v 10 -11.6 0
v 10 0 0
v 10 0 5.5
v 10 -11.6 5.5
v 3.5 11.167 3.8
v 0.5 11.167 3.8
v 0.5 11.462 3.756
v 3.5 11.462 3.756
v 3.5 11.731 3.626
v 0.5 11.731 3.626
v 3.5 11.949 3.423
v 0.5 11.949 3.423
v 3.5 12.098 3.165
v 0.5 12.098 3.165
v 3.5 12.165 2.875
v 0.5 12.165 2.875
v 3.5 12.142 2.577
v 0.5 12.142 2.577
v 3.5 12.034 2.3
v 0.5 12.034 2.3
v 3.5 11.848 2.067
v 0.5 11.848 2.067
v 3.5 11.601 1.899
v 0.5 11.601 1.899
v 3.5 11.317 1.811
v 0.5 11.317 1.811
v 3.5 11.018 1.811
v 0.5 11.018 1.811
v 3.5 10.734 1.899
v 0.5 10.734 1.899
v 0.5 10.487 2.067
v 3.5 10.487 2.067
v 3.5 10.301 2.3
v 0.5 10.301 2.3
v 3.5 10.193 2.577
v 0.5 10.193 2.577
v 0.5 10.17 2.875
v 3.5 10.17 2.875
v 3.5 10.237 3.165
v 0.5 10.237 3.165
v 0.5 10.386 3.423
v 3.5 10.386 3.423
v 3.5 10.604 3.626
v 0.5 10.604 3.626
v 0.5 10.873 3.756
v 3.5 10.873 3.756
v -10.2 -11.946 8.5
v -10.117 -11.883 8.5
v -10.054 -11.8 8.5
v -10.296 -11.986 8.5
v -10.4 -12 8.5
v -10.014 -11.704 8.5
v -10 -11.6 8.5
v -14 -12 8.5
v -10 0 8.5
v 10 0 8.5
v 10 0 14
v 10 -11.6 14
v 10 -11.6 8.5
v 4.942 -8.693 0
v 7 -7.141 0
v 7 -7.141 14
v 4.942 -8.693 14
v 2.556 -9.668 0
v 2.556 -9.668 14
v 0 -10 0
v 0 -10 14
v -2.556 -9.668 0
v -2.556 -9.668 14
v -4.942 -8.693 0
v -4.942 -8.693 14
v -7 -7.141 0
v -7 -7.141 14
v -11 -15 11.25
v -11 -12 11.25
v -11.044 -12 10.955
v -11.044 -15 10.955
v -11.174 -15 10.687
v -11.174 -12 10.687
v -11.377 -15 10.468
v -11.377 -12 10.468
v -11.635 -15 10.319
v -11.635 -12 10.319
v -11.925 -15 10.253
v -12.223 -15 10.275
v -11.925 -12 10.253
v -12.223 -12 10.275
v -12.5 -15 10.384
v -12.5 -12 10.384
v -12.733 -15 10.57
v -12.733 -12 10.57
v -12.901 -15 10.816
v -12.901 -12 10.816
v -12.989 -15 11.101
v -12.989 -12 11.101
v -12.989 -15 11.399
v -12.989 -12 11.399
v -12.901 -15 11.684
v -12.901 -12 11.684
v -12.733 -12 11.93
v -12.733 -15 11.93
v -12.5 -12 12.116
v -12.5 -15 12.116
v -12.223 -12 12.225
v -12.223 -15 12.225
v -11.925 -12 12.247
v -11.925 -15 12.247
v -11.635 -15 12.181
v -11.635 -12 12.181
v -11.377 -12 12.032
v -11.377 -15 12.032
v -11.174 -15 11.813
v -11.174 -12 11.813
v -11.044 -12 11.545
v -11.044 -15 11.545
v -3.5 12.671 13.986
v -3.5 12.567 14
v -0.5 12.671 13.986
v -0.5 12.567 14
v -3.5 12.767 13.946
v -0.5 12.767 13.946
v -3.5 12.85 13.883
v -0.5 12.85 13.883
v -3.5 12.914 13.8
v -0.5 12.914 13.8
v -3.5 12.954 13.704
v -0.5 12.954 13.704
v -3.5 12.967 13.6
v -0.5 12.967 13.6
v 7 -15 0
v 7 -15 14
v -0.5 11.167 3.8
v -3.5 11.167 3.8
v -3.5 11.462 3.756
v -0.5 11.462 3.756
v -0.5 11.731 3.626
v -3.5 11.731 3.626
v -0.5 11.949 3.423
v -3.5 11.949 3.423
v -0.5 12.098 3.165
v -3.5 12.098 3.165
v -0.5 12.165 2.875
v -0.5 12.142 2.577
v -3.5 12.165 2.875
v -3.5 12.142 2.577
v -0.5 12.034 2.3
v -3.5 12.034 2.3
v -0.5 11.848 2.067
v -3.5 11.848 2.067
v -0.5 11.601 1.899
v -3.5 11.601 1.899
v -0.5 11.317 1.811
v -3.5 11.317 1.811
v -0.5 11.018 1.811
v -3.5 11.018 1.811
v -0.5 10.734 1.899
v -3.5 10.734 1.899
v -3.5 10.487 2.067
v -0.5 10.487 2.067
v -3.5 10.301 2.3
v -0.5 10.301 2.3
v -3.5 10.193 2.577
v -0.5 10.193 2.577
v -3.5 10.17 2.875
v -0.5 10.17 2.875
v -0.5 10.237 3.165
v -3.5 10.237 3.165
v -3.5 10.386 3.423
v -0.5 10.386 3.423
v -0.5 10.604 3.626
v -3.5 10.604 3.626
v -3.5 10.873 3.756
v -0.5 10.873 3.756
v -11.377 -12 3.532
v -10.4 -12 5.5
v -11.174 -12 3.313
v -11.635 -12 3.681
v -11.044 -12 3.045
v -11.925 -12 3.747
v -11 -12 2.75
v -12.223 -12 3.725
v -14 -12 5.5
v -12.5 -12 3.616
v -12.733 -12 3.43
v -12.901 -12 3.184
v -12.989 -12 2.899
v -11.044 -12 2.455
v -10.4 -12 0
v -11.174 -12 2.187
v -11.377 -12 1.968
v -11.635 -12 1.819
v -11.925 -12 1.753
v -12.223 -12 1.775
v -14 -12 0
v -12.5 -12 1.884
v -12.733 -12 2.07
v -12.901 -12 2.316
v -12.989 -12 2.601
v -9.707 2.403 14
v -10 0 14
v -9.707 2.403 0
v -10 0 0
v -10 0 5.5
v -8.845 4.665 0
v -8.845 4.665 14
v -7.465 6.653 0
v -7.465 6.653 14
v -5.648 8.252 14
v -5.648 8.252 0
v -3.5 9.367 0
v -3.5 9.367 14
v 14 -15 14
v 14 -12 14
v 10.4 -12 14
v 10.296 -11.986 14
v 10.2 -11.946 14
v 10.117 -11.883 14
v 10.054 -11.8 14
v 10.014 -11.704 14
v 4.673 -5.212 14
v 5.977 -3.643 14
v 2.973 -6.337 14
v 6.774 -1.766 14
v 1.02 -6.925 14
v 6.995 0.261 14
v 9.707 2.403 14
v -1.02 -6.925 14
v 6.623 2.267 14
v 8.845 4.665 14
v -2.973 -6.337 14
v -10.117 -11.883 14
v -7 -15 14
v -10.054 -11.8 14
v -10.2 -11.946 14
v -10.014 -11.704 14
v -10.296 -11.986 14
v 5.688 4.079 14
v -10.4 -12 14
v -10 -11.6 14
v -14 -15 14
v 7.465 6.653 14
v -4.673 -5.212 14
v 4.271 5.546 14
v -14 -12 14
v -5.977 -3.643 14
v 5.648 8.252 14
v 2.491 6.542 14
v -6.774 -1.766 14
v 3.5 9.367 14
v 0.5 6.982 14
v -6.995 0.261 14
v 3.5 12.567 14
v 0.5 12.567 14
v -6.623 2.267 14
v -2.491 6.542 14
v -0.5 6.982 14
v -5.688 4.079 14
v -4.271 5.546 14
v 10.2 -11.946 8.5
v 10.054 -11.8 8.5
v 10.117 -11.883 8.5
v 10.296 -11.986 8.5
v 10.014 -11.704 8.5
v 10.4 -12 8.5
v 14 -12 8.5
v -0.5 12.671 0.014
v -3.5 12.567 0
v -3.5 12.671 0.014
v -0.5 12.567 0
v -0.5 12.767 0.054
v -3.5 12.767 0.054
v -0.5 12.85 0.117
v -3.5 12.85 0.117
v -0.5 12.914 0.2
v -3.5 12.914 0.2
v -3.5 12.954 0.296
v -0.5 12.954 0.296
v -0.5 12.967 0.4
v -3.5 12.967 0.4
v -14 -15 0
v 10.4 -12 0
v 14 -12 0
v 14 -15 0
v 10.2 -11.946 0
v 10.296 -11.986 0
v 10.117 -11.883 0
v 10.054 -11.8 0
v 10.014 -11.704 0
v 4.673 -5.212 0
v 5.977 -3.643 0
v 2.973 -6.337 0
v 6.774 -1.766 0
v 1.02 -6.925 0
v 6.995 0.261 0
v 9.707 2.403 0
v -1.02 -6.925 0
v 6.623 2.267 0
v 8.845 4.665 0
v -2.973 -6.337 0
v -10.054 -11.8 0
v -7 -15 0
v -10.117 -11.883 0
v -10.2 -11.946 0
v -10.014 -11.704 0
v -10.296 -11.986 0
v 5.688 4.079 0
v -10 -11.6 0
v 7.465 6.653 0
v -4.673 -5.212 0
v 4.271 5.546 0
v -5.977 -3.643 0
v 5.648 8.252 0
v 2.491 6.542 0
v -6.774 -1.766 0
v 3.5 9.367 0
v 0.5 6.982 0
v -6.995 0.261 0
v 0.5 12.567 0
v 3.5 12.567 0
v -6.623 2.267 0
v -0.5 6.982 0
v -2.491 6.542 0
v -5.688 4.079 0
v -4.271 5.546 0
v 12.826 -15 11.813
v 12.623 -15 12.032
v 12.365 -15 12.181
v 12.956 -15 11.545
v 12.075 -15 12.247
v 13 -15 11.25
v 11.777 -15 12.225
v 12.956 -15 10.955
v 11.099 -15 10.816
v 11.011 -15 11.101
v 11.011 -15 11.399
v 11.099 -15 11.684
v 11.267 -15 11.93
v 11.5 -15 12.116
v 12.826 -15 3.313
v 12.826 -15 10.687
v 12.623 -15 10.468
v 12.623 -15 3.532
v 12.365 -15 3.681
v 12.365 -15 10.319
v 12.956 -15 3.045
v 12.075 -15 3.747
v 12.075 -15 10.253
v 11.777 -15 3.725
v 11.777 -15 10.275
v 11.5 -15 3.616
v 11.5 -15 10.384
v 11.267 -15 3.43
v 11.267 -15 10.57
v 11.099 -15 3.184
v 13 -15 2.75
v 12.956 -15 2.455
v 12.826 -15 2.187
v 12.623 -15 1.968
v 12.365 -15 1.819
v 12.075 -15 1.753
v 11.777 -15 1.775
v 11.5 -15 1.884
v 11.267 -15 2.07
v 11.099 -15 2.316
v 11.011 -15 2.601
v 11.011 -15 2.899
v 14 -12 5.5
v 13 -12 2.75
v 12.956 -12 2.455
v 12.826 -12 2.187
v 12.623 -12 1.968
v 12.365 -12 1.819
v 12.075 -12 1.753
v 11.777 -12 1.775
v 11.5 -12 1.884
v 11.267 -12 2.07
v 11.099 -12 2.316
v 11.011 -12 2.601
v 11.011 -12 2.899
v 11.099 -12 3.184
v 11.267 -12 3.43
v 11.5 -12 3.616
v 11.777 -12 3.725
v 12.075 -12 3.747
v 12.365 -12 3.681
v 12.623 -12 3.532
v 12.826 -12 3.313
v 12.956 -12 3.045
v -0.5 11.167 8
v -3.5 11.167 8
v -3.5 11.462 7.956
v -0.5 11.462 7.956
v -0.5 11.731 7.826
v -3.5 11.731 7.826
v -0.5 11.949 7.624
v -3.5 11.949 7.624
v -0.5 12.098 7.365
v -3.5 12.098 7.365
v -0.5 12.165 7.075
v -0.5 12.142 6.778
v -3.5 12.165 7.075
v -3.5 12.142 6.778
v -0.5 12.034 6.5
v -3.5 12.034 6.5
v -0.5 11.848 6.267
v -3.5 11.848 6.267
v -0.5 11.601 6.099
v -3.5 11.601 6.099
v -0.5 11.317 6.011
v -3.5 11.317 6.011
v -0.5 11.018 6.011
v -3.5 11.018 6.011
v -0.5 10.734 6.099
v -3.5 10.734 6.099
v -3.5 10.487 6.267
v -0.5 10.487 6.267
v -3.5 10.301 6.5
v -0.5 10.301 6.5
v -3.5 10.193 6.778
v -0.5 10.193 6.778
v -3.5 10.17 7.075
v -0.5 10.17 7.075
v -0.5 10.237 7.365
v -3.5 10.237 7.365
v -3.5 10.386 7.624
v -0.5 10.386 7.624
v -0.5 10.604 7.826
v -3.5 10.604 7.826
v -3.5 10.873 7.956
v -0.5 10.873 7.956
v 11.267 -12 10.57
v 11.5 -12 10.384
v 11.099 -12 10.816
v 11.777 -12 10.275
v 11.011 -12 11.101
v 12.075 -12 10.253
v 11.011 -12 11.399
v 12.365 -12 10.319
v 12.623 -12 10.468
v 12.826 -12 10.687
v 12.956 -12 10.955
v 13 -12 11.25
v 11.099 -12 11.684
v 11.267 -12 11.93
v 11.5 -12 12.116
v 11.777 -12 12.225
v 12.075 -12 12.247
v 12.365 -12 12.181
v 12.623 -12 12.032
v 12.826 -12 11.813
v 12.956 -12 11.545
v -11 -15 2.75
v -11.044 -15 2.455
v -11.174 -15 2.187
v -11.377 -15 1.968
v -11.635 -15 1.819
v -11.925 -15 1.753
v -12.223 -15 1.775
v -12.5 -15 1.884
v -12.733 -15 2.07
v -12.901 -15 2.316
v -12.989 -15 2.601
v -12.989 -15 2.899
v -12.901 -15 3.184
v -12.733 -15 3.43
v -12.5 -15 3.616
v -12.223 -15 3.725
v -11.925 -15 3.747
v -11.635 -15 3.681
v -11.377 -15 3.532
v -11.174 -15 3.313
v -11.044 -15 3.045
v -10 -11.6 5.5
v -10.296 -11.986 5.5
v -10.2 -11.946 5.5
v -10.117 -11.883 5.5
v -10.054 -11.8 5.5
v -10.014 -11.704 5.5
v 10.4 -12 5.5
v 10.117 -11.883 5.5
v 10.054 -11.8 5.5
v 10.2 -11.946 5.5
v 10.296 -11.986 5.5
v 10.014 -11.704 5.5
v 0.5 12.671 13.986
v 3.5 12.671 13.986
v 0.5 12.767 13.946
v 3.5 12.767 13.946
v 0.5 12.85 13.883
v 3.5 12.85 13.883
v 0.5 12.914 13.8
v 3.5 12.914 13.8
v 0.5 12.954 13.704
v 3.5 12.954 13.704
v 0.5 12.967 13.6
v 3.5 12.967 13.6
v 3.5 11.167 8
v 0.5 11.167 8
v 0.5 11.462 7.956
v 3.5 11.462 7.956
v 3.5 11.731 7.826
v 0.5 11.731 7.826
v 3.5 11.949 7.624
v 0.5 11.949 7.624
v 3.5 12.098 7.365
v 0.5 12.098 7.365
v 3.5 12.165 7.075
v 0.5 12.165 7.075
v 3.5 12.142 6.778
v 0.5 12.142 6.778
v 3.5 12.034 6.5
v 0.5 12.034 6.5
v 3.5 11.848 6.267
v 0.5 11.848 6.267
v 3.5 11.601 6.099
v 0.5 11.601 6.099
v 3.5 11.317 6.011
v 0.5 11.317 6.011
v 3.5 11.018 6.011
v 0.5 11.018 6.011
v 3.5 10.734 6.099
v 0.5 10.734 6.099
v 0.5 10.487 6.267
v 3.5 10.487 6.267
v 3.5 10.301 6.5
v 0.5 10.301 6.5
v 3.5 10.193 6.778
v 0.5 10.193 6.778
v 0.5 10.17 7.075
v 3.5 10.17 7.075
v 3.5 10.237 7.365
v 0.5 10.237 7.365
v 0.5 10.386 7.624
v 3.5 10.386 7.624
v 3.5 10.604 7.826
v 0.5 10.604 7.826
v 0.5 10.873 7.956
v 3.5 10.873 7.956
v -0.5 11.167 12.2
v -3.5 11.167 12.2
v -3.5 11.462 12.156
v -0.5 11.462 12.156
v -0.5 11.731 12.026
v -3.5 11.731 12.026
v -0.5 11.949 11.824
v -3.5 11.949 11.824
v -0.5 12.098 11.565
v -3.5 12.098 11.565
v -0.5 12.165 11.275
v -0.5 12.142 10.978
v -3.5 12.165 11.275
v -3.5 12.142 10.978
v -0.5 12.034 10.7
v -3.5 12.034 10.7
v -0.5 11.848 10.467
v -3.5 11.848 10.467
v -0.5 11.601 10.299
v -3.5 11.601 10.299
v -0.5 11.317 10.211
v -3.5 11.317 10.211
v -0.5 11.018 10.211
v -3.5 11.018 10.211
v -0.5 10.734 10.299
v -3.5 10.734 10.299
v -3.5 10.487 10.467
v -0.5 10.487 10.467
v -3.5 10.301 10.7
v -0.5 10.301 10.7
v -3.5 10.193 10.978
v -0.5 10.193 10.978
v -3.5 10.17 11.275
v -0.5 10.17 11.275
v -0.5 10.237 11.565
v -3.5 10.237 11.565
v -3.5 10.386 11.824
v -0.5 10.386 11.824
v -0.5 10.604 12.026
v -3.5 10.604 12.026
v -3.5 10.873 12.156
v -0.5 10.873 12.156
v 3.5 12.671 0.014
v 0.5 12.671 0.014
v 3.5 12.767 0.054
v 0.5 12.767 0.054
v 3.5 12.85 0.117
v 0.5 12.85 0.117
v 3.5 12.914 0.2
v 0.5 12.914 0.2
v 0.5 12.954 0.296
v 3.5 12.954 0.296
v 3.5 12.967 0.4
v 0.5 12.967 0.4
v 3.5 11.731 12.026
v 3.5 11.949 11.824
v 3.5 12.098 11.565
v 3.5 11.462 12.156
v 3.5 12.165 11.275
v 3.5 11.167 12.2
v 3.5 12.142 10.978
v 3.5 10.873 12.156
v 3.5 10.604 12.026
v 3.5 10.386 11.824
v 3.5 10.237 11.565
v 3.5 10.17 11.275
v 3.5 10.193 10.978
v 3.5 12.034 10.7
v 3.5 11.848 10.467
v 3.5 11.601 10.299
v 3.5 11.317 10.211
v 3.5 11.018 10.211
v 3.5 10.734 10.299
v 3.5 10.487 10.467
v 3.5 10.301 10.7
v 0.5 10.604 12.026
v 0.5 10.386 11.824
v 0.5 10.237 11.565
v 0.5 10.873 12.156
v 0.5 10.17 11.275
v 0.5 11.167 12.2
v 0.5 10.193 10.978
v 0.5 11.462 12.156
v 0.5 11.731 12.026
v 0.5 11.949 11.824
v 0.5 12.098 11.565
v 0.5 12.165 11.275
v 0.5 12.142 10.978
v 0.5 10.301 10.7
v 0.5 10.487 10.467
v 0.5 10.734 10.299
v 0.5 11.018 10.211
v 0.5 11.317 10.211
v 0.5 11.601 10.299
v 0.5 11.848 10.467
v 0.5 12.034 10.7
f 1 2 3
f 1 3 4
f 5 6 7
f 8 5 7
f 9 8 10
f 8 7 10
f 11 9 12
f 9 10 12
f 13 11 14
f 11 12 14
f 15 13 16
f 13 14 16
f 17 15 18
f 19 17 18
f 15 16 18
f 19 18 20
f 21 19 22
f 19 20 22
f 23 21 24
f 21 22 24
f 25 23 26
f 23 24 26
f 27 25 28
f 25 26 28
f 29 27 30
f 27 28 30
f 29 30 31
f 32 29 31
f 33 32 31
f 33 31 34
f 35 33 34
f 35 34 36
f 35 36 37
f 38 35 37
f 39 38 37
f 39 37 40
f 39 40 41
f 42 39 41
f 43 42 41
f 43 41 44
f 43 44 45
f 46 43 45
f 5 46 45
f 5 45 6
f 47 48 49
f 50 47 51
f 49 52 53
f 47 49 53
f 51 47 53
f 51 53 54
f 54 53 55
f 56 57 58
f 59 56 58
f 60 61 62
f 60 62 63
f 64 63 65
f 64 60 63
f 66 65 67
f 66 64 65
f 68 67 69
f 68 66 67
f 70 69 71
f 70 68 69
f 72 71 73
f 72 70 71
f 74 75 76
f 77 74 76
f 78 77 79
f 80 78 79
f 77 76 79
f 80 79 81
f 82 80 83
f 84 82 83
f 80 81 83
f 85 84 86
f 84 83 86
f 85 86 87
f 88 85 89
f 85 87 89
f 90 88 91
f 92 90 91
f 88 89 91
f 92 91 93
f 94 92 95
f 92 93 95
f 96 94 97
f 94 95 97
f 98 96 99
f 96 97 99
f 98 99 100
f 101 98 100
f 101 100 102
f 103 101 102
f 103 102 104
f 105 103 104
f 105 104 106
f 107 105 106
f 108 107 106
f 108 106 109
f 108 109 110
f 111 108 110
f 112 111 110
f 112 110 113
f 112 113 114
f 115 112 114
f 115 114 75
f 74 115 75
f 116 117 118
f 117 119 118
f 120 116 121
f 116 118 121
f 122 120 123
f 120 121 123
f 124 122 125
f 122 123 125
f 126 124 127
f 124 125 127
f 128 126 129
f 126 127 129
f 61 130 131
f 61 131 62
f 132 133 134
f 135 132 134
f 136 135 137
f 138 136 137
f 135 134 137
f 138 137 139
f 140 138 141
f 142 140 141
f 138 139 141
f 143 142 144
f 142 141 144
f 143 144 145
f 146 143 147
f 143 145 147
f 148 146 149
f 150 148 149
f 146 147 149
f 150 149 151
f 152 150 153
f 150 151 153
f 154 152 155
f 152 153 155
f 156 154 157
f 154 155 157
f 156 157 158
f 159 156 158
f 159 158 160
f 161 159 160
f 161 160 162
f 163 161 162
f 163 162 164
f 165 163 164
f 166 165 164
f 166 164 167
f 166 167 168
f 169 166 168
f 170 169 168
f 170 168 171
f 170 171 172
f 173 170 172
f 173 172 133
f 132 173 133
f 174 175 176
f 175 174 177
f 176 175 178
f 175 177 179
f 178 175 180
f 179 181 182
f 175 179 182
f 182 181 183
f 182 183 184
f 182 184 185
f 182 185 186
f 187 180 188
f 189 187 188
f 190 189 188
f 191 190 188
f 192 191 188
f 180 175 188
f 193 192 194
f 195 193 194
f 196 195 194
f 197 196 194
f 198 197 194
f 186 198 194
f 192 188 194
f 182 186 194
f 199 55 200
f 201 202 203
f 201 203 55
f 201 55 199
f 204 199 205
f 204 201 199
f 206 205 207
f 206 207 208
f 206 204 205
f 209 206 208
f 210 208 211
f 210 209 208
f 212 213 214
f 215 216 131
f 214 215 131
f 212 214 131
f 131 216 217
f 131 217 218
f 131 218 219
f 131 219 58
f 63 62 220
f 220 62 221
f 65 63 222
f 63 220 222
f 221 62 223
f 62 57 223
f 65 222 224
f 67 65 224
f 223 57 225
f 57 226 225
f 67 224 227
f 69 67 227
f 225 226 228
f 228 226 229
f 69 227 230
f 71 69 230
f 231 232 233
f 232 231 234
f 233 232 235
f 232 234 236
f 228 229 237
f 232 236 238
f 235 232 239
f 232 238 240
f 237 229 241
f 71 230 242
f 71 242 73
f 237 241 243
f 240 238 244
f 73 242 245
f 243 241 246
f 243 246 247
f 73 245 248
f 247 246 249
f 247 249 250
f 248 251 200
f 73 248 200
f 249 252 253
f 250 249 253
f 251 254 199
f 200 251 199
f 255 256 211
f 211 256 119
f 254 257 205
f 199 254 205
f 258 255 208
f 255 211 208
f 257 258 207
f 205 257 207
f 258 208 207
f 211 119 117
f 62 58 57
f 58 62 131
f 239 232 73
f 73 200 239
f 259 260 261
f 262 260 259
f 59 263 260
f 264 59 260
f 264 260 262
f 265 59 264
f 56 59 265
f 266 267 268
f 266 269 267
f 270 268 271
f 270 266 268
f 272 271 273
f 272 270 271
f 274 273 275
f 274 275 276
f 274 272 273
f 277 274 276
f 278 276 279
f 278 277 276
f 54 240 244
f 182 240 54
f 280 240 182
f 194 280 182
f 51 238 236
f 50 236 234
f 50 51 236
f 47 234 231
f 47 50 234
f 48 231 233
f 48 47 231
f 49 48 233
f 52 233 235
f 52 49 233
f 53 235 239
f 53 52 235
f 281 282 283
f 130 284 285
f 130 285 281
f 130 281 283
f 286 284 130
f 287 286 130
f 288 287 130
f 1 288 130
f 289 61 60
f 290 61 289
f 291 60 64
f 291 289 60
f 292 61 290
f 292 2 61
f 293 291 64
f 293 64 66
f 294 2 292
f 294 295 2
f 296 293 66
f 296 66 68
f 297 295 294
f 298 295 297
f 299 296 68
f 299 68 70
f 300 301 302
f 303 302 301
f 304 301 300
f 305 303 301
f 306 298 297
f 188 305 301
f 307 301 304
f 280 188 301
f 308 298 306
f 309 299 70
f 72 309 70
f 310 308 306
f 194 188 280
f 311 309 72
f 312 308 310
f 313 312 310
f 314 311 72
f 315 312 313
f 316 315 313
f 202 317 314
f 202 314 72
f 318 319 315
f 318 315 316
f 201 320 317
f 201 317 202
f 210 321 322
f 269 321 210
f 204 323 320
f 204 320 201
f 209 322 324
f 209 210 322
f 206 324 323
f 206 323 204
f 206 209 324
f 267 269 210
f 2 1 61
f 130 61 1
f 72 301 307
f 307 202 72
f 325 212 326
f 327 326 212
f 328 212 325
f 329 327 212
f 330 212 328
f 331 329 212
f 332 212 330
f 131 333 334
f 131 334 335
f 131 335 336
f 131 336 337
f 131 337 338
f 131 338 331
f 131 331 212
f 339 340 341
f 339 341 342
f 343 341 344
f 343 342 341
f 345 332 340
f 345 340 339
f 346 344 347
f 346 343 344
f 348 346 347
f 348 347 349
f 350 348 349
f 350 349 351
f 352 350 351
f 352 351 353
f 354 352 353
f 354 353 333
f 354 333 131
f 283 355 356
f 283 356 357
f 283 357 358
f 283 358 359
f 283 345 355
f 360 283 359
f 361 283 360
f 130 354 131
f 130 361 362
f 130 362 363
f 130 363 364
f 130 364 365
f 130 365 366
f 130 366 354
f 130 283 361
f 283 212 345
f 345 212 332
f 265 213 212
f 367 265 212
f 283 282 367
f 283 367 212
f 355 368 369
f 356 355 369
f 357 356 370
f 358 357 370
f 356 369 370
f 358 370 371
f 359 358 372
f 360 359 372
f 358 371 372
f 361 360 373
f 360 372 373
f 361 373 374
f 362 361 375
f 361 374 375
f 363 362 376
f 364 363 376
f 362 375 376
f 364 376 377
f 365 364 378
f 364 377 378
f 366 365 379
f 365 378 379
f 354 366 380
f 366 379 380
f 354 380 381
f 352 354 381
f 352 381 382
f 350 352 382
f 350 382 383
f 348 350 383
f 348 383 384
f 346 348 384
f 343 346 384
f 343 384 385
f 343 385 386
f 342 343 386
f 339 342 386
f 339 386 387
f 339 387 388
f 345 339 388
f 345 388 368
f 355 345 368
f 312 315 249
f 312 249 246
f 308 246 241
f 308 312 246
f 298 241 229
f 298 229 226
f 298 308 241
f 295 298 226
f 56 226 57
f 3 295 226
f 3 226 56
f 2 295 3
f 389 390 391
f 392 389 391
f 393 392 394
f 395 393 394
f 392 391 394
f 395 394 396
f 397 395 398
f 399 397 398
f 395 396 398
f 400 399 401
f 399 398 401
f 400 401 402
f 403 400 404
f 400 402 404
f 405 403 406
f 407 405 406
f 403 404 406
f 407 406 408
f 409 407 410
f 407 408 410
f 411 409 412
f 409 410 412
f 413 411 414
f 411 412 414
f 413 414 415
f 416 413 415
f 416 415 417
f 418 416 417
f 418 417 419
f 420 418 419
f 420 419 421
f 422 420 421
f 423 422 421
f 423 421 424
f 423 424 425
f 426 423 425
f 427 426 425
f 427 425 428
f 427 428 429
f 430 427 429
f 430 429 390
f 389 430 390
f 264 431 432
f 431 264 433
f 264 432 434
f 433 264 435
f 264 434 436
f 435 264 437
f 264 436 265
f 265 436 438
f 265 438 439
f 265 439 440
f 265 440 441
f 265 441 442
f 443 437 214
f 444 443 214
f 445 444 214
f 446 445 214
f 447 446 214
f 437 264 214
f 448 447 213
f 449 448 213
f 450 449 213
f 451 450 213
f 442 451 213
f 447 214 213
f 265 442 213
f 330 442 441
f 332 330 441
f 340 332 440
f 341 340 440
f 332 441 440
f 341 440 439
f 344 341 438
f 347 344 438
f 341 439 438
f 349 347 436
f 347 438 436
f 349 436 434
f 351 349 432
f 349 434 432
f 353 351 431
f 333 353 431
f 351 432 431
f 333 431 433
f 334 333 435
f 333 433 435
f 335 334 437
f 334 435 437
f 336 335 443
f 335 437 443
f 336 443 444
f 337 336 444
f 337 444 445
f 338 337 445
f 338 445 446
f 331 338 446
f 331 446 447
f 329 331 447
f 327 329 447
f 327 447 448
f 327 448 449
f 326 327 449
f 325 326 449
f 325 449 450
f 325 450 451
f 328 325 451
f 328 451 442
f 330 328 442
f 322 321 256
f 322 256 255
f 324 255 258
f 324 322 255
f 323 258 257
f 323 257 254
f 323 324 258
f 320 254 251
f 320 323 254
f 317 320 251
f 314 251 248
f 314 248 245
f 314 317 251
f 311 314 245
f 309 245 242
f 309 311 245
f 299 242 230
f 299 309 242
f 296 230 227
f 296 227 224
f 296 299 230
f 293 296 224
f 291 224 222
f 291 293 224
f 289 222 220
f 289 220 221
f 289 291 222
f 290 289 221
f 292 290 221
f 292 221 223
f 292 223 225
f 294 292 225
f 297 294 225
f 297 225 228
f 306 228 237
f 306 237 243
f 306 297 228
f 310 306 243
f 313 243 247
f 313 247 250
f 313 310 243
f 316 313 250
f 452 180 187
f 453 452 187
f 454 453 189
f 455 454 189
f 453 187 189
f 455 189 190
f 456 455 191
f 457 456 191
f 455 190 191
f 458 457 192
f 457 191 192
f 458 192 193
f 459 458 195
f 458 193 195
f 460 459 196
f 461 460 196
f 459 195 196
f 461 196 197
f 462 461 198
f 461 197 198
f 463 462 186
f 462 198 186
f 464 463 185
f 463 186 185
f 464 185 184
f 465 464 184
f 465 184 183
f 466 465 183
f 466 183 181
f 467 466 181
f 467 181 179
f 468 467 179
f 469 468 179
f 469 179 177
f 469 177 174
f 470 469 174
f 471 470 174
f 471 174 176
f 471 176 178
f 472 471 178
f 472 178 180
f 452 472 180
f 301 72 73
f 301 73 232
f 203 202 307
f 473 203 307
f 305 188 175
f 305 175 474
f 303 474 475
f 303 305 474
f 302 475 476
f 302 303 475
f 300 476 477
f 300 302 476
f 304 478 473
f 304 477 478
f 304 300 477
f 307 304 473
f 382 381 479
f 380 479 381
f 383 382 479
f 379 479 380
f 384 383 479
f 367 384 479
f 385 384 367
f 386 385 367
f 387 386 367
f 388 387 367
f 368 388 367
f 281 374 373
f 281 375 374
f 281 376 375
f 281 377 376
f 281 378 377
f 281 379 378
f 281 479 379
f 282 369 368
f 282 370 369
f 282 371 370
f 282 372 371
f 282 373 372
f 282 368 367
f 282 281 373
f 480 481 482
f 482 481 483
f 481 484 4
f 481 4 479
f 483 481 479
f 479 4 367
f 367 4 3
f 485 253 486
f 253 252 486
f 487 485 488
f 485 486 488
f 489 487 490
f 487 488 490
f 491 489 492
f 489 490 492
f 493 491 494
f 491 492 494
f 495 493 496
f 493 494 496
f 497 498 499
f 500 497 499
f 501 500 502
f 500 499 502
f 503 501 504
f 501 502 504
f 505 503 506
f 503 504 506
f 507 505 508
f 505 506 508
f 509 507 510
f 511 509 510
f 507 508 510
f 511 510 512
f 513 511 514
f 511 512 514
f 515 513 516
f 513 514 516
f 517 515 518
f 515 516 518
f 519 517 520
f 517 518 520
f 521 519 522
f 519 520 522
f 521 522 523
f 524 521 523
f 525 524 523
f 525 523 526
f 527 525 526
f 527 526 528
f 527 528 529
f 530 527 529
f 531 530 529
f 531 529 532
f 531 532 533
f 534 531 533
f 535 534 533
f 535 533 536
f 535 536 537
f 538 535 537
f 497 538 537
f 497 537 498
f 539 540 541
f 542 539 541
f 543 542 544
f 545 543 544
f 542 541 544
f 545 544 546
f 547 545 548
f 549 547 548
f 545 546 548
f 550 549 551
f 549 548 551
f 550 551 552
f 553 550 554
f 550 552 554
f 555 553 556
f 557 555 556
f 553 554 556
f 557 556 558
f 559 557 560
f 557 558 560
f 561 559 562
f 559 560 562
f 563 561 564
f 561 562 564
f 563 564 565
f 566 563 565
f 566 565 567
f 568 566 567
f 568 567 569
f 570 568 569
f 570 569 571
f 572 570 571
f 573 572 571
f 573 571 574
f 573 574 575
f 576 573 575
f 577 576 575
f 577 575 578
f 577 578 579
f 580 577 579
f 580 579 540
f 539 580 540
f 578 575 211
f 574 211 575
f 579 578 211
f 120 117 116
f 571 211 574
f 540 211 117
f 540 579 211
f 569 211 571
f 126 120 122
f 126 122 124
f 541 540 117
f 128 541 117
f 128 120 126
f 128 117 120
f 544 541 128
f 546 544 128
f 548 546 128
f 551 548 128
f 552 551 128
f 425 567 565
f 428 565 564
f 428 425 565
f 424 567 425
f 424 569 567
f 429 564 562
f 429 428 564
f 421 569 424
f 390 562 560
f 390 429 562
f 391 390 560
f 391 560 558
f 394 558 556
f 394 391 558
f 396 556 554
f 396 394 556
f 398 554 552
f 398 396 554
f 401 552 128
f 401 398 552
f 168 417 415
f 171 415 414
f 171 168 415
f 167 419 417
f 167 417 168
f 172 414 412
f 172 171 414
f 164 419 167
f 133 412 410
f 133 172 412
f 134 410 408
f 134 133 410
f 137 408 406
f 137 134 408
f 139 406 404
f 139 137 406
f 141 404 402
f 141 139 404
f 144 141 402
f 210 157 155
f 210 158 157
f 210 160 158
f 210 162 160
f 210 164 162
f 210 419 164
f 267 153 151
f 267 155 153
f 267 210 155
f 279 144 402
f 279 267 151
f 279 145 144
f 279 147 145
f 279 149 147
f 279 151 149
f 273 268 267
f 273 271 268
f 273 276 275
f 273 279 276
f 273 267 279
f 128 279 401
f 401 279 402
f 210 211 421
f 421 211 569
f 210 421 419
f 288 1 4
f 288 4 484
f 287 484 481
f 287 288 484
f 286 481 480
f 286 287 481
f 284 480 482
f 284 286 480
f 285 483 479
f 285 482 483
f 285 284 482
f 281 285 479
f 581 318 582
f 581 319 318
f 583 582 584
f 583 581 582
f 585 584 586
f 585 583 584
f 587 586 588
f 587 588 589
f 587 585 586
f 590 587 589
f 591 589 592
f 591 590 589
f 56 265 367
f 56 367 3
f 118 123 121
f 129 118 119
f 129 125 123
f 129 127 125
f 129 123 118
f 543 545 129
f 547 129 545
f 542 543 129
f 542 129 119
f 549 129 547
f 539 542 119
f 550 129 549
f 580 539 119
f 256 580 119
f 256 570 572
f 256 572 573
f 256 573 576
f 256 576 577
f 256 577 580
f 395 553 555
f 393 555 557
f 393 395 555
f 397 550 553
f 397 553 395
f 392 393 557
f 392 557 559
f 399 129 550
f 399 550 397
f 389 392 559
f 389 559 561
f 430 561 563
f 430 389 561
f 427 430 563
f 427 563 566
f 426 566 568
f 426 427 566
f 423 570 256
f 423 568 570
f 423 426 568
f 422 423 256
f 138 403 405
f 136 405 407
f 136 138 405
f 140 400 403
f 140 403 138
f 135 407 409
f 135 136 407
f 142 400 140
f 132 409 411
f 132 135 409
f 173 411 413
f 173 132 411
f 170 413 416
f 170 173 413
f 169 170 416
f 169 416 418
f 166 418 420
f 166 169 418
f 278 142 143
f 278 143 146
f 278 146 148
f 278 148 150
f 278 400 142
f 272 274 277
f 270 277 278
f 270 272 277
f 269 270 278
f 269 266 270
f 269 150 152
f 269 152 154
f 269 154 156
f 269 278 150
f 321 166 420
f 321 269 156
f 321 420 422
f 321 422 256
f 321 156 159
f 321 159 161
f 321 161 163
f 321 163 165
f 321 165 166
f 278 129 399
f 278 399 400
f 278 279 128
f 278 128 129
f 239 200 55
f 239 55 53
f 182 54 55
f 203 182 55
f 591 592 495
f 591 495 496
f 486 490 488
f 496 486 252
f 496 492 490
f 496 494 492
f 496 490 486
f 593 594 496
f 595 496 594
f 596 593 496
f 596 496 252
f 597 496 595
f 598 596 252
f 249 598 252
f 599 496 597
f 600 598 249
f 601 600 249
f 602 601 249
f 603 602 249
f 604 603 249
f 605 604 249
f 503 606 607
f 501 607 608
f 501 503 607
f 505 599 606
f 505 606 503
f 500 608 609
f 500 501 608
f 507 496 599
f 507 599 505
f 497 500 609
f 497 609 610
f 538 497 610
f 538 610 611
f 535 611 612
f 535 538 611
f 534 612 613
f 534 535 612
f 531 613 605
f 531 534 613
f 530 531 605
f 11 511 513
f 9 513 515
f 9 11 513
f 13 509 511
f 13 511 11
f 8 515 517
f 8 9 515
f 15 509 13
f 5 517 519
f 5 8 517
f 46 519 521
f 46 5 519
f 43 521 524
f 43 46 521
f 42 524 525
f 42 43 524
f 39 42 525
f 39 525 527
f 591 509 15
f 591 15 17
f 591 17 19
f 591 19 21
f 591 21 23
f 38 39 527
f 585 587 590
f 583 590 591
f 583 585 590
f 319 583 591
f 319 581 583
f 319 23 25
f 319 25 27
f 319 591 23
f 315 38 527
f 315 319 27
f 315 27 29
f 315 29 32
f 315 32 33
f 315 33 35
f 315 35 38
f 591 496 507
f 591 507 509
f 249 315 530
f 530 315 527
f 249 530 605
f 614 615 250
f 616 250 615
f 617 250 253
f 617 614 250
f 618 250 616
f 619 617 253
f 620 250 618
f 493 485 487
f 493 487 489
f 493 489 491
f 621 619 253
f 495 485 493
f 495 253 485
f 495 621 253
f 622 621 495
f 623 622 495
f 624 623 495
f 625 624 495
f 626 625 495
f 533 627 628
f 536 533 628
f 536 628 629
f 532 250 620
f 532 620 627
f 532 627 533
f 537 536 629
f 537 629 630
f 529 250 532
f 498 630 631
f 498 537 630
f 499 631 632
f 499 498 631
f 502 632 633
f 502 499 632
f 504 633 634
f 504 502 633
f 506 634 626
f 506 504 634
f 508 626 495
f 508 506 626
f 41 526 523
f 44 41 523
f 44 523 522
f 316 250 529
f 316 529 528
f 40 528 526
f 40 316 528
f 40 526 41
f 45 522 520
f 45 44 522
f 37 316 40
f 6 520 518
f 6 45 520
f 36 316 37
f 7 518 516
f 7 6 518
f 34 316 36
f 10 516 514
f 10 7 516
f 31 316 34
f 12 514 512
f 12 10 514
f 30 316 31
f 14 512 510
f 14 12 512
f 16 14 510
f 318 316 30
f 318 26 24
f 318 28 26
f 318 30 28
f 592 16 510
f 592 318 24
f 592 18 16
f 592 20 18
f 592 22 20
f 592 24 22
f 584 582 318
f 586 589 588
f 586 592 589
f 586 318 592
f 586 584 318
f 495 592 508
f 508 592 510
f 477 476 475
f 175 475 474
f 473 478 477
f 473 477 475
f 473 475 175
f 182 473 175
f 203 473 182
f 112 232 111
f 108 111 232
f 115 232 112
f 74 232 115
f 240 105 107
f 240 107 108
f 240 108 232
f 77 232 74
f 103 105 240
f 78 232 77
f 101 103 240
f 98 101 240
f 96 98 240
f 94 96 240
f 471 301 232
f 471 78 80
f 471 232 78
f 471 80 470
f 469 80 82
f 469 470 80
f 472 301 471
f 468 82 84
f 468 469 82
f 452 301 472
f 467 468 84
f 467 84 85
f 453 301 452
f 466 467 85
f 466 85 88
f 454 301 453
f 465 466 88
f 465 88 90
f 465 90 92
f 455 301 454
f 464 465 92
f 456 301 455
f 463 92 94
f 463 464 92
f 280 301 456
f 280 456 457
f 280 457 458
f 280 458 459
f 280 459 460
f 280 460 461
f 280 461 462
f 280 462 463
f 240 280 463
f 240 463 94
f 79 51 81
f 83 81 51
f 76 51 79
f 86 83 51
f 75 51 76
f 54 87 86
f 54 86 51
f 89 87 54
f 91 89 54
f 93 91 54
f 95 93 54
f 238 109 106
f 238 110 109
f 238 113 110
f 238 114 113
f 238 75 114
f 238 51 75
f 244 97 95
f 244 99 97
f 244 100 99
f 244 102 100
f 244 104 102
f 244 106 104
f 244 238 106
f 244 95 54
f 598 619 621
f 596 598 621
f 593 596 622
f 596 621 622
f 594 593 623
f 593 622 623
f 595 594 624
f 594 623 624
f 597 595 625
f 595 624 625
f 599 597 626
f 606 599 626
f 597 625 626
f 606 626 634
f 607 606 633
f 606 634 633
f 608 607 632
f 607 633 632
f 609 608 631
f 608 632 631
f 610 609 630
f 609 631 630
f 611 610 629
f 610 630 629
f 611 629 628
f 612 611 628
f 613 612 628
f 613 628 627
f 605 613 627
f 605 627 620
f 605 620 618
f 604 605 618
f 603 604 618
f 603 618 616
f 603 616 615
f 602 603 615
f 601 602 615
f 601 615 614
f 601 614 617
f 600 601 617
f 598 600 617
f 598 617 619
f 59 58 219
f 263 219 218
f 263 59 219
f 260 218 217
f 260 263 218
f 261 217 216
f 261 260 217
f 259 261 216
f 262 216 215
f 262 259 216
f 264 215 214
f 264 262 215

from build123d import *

# Parameters (mm, degrees)
SALIENTE_EXTRUIR1_DEPTH    = 14
CROQUIS2_W                 = 0.4
CROQUIS2_H                 = 0.4
CORTAR_EXTRUIR1_DEPTH      = 1
CORTAR_EXTRUIR1_DEPTH_BACK = 15
SALIENTE_EXTRUIR2_DEPTH    = 14
CORTAR_EXTRUIR2_DEPTH      = 1
CORTAR_EXTRUIR2_DEPTH_BACK = 5.5
CORTAR_EXTRUIR3_DEPTH      = 5.5
SALIENTE_EXTRUIR3_DEPTH    = 14
CROQUIS7_R                 = 1
CORTAR_EXTRUIR4_DEPTH      = 4
REDONDEO3_R                = 0.4
CROQUIS9_R                 = 1
CORTAR_EXTRUIR5_DEPTH      = 18.5


with BuildPart() as part:
    # Croquis1 → Saliente-Extruir1 (new body)
    with BuildSketch(Plane.XY):
        with BuildLine():
            Line((0.5, 6.982120022), (0.5, 12.967496998))
            Line((0.5, 12.967496998), (3.5, 12.967496998))
            Line((3.5, 12.967496998), (3.5, 9.367496998))
            ThreePointArc((3.5, 9.367496998), (8.215838363, 5.700877125), (10, 0))
            Line((10, 0), (10, -11.6))
            ThreePointArc((10, -11.6), (10.117157288, -11.882842712), (10.4, -12))
            Line((10.4, -12), (14, -12))
            Line((14, -12), (14, -15))
            Line((14, -15), (7, -15))
            Line((7, -15), (7, -7.141428429))
            ThreePointArc((7, -7.141428429), (0, -10), (-7, -7.141428429))
            Line((-7, -7.141428429), (-7, -15))
            Line((-7, -15), (-14, -15))
            Line((-14, -15), (-14, -12))
            Line((-14, -12), (-10.4, -12))
            ThreePointArc((-10.4, -12), (-10.117157288, -11.882842712), (-10, -11.6))
            Line((-10, -11.6), (-10, 0))
            ThreePointArc((-10, 0), (-8.215838363, 5.700877125), (-3.5, 9.367496998))
            Line((-3.5, 9.367496998), (-3.5, 12.967496998))
            Line((-3.5, 12.967496998), (-0.5, 12.967496998))
            Line((-0.5, 12.967496998), (-0.5, 6.982120022))
            ThreePointArc((-0.5, 6.982120022), (0, -7), (0.5, 6.982120022))
        make_face()
    extrude(amount=SALIENTE_EXTRUIR1_DEPTH)

    # Croquis2 → Cortar-Extruir1 (cut, two sides)
    with BuildSketch(Plane.XY.offset(14)) as cortar_extruir1_sk:
        with Locations((-7.2, -14.8)):
            Rectangle(CROQUIS2_W, CROQUIS2_H)
        with Locations((7.2, -14.8)):
            Rectangle(CROQUIS2_W, CROQUIS2_H)
    extrude(amount=CORTAR_EXTRUIR1_DEPTH, mode=Mode.SUBTRACT)
    extrude(cortar_extruir1_sk.sketch, amount=-CORTAR_EXTRUIR1_DEPTH_BACK, mode=Mode.SUBTRACT)

    # Croquis4 → Saliente-Extruir2 (add, through all)
    with BuildSketch(Plane.XY.offset(14)):
        Polygon((-14, -12), (-10, 0), (-10, -12), align=None)
        Polygon((14, -12), (10, 0), (10, -12), align=None)
    extrude(amount=-SALIENTE_EXTRUIR2_DEPTH)

    # Croquis5 → Cortar-Extruir2 (cut, two sides)
    with BuildSketch(Plane.XY.offset(14)) as cortar_extruir2_sk:
        Polygon((-14, -12), (-10, 0), (-10, -12), align=None)
        Polygon((14, -12), (10, 0), (10, -12), align=None)
    extrude(amount=CORTAR_EXTRUIR2_DEPTH, mode=Mode.SUBTRACT)
    extrude(cortar_extruir2_sk.sketch, amount=-CORTAR_EXTRUIR2_DEPTH_BACK, mode=Mode.SUBTRACT)

    # Croquis6 → Cortar-Extruir3 (cut)
    with BuildSketch(Plane(origin=(0, 0, 0), x_dir=(-1, 0, 0), z_dir=(0, 0, -1))):
        Polygon((-14, -12), (-10, 0), (-10, -12), align=None)
        Polygon((14, -12), (10, 0), (10, -12), align=None)
    extrude(amount=-CORTAR_EXTRUIR3_DEPTH, mode=Mode.SUBTRACT)

    # Croquis1<2> → Saliente-Extruir3 (add, through all)
    with BuildSketch(Plane.XY):
        with BuildLine():
            Line((0.5, 6.982120022), (0.5, 12.967496998))
            Line((0.5, 12.967496998), (3.5, 12.967496998))
            Line((3.5, 12.967496998), (3.5, 9.367496998))
            ThreePointArc((3.5, 9.367496998), (8.215838363, 5.700877125), (10, 0))
            Line((10, 0), (10, -11.6))
            ThreePointArc((10, -11.6), (10.117157288, -11.882842712), (10.4, -12))
            Line((10.4, -12), (14, -12))
            Line((14, -12), (14, -15))
            Line((14, -15), (7, -15))
            Line((7, -15), (7, -7.141428429))
            ThreePointArc((7, -7.141428429), (0, -10), (-7, -7.141428429))
            Line((-7, -7.141428429), (-7, -15))
            Line((-7, -15), (-14, -15))
            Line((-14, -15), (-14, -12))
            Line((-14, -12), (-10.4, -12))
            ThreePointArc((-10.4, -12), (-10.117157288, -11.882842712), (-10, -11.6))
            Line((-10, -11.6), (-10, 0))
            ThreePointArc((-10, 0), (-8.215838363, 5.700877125), (-3.5, 9.367496998))
            Line((-3.5, 9.367496998), (-3.5, 12.967496998))
            Line((-3.5, 12.967496998), (-0.5, 12.967496998))
            Line((-0.5, 12.967496998), (-0.5, 6.982120022))
            ThreePointArc((-0.5, 6.982120022), (0, -7), (0.5, 6.982120022))
        make_face()
    extrude(amount=SALIENTE_EXTRUIR3_DEPTH)

    # Croquis7 → Cortar-Extruir4 (cut, through all)
    with BuildSketch(Plane(origin=(0, -12, 0), x_dir=(1, 0, 0), z_dir=(0, 1, 0))):
        with Locations((-12, -11.25)):
            Circle(CROQUIS7_R)
        with Locations((-12, -2.75)):
            Circle(CROQUIS7_R)
        with Locations((12, -2.75)):
            Circle(CROQUIS7_R)
        with Locations((12, -11.25)):
            Circle(CROQUIS7_R)
    extrude(amount=-CORTAR_EXTRUIR4_DEPTH, mode=Mode.SUBTRACT)

    # Redondeo3
    redondeo3_edges = [part.edges().sort_by_distance(p)[0] for p in [
        (-2, 12.967496998, 0),
        (2, 12.967496998, 14),
        (-2, 12.967496998, 14),
        (2, 12.967496998, 0),
    ]]
    fillet(redondeo3_edges, radius=REDONDEO3_R)

    # Croquis9 → Cortar-Extruir5 (cut, through all)
    with BuildSketch(Plane.ZY.offset(3.5)):
        with Locations((2.8, 11.167496998)):
            Circle(CROQUIS9_R)
        with Locations((7.000061, 11.167496998)):
            Circle(CROQUIS9_R)
        with Locations((11.200061, 11.167496998)):
            Circle(CROQUIS9_R)
    extrude(amount=-CORTAR_EXTRUIR5_DEPTH, mode=Mode.SUBTRACT)


solid = part.part
